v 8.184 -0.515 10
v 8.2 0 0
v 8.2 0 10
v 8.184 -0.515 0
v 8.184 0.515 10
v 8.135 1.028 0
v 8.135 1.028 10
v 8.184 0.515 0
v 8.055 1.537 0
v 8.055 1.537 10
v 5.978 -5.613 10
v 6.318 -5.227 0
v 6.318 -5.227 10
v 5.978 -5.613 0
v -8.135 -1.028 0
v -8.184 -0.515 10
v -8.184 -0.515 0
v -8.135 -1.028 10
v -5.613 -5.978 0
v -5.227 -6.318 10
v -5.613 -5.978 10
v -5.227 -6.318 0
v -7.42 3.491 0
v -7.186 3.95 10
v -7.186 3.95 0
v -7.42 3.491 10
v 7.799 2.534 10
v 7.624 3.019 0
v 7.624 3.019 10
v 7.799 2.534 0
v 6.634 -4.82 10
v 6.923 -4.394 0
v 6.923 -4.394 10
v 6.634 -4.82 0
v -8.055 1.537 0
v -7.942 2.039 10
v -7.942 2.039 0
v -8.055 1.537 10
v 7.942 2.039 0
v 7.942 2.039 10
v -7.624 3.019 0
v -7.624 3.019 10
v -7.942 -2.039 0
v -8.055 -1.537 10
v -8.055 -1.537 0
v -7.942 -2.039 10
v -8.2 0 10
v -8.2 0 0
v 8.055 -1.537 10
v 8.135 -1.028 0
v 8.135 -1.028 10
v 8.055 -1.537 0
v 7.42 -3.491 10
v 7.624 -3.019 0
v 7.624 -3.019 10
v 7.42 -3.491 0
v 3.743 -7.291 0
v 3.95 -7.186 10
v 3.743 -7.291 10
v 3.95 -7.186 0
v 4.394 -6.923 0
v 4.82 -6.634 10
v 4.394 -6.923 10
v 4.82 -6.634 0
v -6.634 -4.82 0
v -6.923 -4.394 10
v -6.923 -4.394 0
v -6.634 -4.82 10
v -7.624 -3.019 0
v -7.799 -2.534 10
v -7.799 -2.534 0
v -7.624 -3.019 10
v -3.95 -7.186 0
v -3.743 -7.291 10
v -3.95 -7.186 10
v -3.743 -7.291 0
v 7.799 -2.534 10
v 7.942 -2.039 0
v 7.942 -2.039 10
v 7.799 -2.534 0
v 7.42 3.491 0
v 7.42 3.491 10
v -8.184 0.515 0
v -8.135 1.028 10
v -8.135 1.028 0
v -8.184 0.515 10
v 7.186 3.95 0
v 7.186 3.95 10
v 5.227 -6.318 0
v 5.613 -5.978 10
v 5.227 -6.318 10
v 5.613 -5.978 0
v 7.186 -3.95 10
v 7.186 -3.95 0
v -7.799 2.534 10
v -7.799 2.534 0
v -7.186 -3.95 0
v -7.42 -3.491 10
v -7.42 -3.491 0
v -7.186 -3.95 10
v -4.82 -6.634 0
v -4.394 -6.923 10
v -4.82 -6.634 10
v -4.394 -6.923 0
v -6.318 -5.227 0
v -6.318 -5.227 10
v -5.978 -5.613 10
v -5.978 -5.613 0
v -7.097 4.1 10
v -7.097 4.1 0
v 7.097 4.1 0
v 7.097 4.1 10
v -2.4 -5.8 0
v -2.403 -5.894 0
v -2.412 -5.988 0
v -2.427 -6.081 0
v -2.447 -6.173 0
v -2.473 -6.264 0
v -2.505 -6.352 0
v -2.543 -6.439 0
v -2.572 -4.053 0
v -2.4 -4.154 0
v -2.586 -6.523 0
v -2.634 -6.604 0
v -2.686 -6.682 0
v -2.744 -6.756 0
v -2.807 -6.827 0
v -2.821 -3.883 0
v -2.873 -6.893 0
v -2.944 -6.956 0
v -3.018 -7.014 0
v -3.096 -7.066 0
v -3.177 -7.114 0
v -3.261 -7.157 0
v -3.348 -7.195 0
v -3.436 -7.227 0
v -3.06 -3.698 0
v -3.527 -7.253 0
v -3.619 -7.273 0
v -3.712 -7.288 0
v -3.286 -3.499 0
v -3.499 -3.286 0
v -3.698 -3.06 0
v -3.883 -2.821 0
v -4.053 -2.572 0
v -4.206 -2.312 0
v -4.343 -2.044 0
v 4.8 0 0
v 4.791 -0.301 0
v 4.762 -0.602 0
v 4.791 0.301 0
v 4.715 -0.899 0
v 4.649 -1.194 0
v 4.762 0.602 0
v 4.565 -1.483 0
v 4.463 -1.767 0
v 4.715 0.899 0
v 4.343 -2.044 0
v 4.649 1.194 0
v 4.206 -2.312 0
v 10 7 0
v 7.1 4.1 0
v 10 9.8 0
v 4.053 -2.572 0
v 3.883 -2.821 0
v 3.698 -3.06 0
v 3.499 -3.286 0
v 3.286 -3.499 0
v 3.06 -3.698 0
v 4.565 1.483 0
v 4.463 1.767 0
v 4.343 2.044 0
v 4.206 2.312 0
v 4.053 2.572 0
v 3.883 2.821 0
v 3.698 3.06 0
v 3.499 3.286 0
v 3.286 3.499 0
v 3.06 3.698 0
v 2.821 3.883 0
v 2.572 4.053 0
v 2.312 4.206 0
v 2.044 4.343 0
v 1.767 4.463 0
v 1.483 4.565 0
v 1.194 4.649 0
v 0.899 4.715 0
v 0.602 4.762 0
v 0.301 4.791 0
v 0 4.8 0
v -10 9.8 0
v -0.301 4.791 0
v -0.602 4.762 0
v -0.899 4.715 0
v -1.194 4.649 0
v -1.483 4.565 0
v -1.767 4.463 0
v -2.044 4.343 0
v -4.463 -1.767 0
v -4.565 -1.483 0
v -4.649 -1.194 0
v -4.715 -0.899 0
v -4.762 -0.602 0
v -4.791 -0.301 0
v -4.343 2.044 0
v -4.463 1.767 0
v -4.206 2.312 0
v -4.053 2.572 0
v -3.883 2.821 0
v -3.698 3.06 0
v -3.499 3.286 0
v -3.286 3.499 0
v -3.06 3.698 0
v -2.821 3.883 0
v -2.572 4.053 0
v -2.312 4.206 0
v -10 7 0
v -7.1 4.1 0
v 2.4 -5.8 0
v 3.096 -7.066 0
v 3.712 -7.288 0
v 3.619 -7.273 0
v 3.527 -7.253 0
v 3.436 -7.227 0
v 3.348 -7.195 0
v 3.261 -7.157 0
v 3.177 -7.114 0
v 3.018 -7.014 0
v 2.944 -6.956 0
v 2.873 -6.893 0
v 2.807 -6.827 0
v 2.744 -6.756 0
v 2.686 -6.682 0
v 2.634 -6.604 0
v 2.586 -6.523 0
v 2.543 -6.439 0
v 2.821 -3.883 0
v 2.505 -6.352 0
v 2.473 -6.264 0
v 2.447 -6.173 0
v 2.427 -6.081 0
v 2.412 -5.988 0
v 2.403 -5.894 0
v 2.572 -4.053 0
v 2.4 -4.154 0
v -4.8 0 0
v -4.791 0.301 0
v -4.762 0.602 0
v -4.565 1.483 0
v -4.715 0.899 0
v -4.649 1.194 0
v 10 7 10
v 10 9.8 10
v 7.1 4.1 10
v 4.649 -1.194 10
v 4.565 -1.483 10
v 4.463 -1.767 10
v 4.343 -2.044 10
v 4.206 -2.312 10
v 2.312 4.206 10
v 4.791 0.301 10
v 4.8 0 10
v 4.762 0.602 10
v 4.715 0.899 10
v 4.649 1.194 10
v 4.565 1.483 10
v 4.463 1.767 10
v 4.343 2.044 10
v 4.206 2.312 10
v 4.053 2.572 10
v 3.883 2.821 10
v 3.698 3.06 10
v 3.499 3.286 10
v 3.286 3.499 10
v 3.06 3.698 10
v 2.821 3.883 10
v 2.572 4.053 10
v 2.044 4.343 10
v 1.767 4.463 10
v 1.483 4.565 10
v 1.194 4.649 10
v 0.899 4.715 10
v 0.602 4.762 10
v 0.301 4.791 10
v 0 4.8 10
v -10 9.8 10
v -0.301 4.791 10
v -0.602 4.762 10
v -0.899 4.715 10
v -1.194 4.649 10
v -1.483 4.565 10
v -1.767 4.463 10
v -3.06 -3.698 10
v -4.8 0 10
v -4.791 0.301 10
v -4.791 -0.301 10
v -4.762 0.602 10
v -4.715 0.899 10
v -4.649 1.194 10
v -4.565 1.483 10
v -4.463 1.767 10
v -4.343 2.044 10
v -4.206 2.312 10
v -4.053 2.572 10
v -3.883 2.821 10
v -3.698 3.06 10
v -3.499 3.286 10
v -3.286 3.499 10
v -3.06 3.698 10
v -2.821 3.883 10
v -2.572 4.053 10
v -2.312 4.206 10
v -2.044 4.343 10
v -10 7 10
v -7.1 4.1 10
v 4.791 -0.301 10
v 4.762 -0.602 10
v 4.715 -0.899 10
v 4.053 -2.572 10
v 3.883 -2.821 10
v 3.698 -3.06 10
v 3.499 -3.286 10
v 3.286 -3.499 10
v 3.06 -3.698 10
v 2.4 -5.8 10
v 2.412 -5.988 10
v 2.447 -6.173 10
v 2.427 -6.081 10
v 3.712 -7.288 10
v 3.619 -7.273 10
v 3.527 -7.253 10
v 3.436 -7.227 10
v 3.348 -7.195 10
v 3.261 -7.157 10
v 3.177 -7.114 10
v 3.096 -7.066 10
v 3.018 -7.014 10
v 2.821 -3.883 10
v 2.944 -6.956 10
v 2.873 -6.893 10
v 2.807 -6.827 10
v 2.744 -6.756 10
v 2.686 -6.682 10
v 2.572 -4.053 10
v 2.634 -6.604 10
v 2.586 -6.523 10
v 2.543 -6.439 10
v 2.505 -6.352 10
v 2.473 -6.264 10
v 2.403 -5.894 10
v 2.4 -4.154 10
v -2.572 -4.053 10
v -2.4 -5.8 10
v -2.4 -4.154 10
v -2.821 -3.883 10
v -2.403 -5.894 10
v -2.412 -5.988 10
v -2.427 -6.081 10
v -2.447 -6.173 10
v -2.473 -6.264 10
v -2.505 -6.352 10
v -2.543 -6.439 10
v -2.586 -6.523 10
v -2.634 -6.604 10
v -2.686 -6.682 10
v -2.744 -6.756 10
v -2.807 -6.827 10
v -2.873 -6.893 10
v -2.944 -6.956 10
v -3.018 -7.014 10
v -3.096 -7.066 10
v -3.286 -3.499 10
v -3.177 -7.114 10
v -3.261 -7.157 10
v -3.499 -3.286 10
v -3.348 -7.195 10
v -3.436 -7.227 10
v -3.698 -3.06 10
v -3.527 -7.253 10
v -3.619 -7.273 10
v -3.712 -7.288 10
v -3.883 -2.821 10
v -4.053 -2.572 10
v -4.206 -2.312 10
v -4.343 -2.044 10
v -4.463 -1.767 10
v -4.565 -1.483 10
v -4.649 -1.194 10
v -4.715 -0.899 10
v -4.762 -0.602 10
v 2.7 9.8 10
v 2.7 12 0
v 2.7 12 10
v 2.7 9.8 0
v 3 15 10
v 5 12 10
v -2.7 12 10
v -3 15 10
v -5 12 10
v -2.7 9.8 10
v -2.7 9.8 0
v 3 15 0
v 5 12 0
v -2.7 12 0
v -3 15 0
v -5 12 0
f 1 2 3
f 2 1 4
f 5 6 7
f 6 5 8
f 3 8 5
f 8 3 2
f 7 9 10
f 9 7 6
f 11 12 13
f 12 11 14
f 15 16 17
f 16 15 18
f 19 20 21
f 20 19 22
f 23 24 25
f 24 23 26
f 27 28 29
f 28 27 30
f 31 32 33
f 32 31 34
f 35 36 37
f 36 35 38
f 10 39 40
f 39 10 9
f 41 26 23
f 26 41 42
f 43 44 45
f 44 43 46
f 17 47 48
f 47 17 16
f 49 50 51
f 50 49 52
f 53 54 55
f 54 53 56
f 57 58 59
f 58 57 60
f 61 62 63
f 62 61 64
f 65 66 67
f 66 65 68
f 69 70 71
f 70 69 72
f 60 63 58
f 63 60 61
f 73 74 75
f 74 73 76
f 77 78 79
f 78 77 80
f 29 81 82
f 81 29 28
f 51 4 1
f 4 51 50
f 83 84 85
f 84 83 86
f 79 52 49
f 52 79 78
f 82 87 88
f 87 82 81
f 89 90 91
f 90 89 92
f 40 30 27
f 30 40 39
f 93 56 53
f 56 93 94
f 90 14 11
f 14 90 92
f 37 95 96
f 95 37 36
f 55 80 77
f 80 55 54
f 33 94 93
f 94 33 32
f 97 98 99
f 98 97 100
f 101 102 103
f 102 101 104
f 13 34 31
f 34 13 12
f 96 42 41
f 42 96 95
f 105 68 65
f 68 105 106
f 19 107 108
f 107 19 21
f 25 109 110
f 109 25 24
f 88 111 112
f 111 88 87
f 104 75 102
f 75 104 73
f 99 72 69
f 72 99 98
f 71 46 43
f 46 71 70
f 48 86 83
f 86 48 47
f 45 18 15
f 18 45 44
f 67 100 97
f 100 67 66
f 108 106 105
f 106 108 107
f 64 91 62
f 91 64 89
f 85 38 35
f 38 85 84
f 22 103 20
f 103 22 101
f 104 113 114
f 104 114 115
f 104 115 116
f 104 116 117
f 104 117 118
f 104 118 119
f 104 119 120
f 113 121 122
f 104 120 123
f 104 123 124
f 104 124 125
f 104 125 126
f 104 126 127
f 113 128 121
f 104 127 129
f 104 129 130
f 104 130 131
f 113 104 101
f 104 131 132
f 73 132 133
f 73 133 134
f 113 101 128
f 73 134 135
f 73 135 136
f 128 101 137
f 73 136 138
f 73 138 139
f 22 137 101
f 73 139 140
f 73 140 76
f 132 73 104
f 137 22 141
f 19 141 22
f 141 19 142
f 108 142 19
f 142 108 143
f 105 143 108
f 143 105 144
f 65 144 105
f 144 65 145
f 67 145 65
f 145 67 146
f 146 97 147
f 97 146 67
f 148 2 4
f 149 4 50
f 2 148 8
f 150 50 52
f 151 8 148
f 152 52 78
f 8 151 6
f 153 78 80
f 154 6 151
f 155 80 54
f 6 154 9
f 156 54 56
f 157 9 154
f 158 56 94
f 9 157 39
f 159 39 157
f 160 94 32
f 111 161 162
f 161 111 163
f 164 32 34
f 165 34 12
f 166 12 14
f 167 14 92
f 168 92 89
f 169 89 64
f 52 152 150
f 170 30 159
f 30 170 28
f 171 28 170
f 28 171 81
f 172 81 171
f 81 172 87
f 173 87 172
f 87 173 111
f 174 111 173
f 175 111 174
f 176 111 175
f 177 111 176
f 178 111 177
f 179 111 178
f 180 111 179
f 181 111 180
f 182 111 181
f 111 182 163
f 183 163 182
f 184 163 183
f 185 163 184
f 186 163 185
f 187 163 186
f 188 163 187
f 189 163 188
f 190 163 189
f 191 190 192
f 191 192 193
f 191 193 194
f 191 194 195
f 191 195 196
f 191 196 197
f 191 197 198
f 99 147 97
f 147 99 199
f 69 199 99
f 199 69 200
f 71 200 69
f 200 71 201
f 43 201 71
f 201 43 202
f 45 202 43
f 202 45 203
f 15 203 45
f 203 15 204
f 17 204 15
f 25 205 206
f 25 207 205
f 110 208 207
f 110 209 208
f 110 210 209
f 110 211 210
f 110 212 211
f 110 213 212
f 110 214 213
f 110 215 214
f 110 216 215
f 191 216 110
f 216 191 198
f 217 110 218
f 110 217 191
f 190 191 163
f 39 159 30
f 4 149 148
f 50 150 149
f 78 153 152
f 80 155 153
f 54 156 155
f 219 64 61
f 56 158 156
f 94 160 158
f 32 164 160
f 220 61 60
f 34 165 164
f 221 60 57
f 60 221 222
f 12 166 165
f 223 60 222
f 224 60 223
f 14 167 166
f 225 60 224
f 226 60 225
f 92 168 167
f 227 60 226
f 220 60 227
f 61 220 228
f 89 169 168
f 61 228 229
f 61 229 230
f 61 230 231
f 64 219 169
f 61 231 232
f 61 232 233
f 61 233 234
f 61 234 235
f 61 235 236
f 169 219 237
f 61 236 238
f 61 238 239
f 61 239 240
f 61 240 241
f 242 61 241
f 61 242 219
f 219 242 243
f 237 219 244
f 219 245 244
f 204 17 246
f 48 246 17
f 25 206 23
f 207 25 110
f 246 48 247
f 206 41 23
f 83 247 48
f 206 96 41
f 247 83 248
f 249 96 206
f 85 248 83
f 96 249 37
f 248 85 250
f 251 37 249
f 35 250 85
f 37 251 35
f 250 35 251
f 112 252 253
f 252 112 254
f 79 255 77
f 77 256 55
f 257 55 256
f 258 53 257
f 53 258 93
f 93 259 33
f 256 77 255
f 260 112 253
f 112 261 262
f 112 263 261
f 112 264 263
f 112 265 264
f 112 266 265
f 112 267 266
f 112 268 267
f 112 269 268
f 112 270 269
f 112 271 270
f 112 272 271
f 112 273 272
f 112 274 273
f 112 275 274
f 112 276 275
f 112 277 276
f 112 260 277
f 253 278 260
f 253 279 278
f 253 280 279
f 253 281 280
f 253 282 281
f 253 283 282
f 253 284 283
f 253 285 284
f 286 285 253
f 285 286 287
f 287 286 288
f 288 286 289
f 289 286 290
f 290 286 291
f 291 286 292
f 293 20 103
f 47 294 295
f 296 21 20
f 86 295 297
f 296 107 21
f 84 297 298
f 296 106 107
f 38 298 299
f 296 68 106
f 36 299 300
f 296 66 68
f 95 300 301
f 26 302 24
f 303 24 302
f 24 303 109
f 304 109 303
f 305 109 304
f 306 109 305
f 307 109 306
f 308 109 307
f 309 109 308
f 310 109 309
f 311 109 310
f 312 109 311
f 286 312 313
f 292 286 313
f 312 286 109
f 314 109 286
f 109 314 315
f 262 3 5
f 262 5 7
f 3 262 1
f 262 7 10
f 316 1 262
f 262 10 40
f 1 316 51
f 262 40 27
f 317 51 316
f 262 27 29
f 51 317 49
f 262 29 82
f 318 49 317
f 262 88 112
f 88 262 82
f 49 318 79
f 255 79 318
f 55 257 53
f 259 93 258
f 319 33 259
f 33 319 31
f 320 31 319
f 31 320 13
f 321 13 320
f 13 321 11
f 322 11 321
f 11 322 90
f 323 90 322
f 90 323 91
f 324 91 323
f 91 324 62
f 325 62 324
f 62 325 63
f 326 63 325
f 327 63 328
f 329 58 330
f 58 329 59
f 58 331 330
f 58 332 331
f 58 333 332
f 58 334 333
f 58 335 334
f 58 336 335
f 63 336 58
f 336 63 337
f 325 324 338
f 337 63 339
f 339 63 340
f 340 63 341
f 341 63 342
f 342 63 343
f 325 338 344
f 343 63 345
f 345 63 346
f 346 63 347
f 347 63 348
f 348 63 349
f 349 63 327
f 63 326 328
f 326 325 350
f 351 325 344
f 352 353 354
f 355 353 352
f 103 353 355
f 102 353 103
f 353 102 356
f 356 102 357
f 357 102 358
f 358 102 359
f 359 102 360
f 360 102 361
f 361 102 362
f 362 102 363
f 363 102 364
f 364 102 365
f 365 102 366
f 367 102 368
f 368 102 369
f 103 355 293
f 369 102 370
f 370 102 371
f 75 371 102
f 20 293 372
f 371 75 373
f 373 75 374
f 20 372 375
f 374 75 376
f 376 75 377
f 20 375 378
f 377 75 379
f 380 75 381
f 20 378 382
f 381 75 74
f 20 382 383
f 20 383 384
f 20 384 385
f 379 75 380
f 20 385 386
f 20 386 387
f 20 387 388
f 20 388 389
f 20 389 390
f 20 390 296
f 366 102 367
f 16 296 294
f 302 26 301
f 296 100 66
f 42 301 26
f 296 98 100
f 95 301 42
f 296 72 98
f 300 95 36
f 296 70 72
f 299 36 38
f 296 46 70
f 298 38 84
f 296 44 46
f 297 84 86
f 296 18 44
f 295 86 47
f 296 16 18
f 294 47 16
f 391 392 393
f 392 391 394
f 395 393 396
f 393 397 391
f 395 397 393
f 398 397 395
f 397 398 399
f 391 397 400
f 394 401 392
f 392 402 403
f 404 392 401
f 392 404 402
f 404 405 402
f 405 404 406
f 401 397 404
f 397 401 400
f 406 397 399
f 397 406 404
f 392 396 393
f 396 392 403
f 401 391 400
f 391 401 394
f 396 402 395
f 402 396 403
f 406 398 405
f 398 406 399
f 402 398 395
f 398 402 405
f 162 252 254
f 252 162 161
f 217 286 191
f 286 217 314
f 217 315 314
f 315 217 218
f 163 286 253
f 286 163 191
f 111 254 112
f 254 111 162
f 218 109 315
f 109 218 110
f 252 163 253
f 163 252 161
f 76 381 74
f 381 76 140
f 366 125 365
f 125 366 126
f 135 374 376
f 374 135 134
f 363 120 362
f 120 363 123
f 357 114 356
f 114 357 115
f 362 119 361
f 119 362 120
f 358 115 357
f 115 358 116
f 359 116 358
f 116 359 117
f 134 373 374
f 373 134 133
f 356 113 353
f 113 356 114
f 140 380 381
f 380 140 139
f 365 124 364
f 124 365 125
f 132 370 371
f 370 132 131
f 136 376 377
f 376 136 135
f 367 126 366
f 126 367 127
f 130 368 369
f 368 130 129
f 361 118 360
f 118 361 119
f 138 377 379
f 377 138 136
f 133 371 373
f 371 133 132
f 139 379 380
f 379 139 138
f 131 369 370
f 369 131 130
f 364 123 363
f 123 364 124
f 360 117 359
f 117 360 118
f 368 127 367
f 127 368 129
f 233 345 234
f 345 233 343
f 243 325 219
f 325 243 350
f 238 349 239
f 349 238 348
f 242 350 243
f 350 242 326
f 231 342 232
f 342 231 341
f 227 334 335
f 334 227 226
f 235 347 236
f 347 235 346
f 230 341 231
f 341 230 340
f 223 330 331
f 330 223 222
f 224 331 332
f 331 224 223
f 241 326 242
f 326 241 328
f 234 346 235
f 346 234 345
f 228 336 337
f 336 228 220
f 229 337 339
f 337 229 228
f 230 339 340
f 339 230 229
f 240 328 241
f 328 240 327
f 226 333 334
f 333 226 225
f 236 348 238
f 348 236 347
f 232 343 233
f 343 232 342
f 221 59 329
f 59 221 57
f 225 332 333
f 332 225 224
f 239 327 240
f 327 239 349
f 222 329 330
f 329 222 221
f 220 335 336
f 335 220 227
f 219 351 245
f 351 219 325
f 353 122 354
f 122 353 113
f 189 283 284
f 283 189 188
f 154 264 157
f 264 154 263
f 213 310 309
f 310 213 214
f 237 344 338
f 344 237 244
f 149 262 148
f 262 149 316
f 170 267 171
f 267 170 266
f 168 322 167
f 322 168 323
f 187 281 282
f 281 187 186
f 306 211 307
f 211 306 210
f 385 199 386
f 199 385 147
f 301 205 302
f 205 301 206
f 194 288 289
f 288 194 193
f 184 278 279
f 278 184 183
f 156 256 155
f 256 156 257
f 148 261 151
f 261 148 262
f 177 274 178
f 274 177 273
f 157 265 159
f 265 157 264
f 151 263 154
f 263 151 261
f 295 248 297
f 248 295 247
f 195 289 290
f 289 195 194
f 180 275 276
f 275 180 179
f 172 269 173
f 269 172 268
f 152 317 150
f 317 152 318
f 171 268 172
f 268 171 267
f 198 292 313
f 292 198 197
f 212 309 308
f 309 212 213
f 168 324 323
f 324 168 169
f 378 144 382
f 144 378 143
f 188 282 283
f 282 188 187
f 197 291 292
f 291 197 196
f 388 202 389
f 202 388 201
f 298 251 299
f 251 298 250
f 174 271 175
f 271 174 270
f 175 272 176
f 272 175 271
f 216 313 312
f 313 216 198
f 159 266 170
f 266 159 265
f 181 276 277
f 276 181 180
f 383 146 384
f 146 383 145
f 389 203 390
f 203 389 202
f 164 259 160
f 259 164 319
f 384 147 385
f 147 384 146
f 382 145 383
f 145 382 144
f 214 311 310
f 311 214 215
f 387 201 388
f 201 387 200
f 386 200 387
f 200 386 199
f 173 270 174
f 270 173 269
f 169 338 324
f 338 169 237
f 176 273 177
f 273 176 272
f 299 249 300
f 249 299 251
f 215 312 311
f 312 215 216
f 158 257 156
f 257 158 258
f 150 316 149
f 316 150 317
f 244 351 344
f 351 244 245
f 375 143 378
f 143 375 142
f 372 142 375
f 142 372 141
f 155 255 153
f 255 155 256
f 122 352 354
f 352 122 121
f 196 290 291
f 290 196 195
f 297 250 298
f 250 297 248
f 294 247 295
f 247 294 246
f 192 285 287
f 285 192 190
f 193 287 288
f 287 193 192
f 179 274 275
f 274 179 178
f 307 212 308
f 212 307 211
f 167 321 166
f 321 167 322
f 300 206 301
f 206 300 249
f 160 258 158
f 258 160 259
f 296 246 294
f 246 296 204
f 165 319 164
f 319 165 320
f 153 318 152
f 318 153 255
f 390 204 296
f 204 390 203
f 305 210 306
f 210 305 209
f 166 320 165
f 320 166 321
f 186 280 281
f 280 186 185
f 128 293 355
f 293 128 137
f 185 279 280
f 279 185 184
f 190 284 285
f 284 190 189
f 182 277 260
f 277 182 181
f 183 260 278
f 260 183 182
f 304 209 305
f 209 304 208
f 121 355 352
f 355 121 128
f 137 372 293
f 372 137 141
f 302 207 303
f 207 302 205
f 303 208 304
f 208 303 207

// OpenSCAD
// file: functions.scad
/**********************************
	File: functions.scad
	Revision: 0.1 (10/7/2012)
	OpenSCAD version by:
	Michael Williams (gannon)
	mswillia@mtu.edu
**********************************/
include <config.scad>

//Drill a hole the given depth at the given location
module drill(x,y,radius,depth) {
	translate([x,y,-overdrill])
		cylinder(r=radius,h=depth,$fn=100);
}

module roundedcorner(radius,thickness,angle) {
	rotate([0,0,angle])
		translate([-radius+overdrill,-radius+overdrill,-overdrill])
			difference() {
				translate([-overdrill,-overdrill,0])
					cube([radius+overdrill,radius+overdrill,thickness+overdrill*2]);
				cylinder(r=radius,h=thickness+overdrill*2);
			}
}

//Usage: points is an array consisting of elements
//[x,y,r] for each point of the polygon
//Please note that x and y will be the centers
//of the rounded edges! Outside wall will be
//r away at some angle.
//Ideally I will make a function that will find
//the place to put the circle of a given radius
//based off of the points in the polygon.
module multiradiusroundedpoly(points,height) {
	linear_extrude(height=height)
		hull()
			for (p = points) {
				translate([p[0],p[1],0])
					circle(r=p[2],$fn=100);
			}
}
// file: config.scad
/**********************************
	File: config.scad
	Revision: 0.2 (1/5/2013)
	OpenSCAD version by:
	Michael Williams (gannon)
	mswillia@mtu.edu
**********************************/

/**********************************
		CONFIGURATION
**********************************/
//This is for the depth of holes so OpenSCAD renders correctly.
overdrill=0.1;

//LM10UU
linear_bearing_length=29;
linear_bearing_ID=10;
linear_bearing_OD=19;

//HFSB5-2020 extrusions
extrusion_height=20;
extrusion_width=20;

//Small rods
small_rod_diameter=8;

//Large rods
large_rod_diameter=10;

//608zz
skate_bearings_length=7;
skate_bearings_ID=8;
skate_bearings_OD=22;

/*
3/8"-12 acme rod
m8 threaded rod
*/

screw_a_diameter=3;
screw_b_diameter=4;
screw_c_diameter=5;
screw_d_diameter=8;

/**********************************
		END CONFIGURATION
**********************************/
// main file
/**********************************
	File: CableHolder.scad
	Revision: 0.3 (1/5/2013)
	OpenSCAD version by:
	Michael Williams (gannon)
	mswillia@mtu.edu
**********************************/
include <config.scad>
use <functions.scad>
/**********************************
		CONFIGURATION
**********************************/
//Base size
thickness=10;
wall_thickness=3.4;
radius=4.8;
opening=4.8;

/**********************************
		END CONFIGURATION
**********************************/

difference() {
	//Make our base unit
	union() {
		cylinder(r=radius+wall_thickness,h=thickness,$fn=100);
		translate([-2.7,radius+5,0])
			cube([5.4,2.2,thickness]);
		translate([0,radius+7.2,0])
			linear_extrude(height=thickness)
				polygon(points=[[-5,0],[-3,3],[3,3],[5,0]]);
		translate([0,radius-0.7,0])
			linear_extrude(height=thickness)
				polygon(points=[[-7.1,0],[-10,2.9],[-10,5.7],[10,5.7],[10,2.9],[7.1,0]]);
	}

	//Drill the hole
	drill(0,0,radius,thickness+overdrill*2);

	//This is actually slightly trapezoidal in the sketchup
	//4.8mm inside and 5.0mm outside...leaving it square for now
	translate([-opening/2,-(radius+wall_thickness+overdrill),-overdrill])
		union() {
			cube([opening,radius+wall_thickness+overdrill,thickness+overdrill*2]);

			translate([-1.5,2.5,-overdrill]) difference() {
				translate([0,-3,overdrill])
					cube([3,3,thickness+overdrill*2]);
				cylinder(r=1.5,h=thickness+overdrill*4,$fn=100);
			}
			translate([opening+1.5,2.5,-overdrill]) difference() {
				translate([-3,-3,overdrill])
					cube([3,3,thickness+overdrill*2]);
				cylinder(r=1.5,h=thickness+overdrill*4,$fn=100);
			}
		}
}
